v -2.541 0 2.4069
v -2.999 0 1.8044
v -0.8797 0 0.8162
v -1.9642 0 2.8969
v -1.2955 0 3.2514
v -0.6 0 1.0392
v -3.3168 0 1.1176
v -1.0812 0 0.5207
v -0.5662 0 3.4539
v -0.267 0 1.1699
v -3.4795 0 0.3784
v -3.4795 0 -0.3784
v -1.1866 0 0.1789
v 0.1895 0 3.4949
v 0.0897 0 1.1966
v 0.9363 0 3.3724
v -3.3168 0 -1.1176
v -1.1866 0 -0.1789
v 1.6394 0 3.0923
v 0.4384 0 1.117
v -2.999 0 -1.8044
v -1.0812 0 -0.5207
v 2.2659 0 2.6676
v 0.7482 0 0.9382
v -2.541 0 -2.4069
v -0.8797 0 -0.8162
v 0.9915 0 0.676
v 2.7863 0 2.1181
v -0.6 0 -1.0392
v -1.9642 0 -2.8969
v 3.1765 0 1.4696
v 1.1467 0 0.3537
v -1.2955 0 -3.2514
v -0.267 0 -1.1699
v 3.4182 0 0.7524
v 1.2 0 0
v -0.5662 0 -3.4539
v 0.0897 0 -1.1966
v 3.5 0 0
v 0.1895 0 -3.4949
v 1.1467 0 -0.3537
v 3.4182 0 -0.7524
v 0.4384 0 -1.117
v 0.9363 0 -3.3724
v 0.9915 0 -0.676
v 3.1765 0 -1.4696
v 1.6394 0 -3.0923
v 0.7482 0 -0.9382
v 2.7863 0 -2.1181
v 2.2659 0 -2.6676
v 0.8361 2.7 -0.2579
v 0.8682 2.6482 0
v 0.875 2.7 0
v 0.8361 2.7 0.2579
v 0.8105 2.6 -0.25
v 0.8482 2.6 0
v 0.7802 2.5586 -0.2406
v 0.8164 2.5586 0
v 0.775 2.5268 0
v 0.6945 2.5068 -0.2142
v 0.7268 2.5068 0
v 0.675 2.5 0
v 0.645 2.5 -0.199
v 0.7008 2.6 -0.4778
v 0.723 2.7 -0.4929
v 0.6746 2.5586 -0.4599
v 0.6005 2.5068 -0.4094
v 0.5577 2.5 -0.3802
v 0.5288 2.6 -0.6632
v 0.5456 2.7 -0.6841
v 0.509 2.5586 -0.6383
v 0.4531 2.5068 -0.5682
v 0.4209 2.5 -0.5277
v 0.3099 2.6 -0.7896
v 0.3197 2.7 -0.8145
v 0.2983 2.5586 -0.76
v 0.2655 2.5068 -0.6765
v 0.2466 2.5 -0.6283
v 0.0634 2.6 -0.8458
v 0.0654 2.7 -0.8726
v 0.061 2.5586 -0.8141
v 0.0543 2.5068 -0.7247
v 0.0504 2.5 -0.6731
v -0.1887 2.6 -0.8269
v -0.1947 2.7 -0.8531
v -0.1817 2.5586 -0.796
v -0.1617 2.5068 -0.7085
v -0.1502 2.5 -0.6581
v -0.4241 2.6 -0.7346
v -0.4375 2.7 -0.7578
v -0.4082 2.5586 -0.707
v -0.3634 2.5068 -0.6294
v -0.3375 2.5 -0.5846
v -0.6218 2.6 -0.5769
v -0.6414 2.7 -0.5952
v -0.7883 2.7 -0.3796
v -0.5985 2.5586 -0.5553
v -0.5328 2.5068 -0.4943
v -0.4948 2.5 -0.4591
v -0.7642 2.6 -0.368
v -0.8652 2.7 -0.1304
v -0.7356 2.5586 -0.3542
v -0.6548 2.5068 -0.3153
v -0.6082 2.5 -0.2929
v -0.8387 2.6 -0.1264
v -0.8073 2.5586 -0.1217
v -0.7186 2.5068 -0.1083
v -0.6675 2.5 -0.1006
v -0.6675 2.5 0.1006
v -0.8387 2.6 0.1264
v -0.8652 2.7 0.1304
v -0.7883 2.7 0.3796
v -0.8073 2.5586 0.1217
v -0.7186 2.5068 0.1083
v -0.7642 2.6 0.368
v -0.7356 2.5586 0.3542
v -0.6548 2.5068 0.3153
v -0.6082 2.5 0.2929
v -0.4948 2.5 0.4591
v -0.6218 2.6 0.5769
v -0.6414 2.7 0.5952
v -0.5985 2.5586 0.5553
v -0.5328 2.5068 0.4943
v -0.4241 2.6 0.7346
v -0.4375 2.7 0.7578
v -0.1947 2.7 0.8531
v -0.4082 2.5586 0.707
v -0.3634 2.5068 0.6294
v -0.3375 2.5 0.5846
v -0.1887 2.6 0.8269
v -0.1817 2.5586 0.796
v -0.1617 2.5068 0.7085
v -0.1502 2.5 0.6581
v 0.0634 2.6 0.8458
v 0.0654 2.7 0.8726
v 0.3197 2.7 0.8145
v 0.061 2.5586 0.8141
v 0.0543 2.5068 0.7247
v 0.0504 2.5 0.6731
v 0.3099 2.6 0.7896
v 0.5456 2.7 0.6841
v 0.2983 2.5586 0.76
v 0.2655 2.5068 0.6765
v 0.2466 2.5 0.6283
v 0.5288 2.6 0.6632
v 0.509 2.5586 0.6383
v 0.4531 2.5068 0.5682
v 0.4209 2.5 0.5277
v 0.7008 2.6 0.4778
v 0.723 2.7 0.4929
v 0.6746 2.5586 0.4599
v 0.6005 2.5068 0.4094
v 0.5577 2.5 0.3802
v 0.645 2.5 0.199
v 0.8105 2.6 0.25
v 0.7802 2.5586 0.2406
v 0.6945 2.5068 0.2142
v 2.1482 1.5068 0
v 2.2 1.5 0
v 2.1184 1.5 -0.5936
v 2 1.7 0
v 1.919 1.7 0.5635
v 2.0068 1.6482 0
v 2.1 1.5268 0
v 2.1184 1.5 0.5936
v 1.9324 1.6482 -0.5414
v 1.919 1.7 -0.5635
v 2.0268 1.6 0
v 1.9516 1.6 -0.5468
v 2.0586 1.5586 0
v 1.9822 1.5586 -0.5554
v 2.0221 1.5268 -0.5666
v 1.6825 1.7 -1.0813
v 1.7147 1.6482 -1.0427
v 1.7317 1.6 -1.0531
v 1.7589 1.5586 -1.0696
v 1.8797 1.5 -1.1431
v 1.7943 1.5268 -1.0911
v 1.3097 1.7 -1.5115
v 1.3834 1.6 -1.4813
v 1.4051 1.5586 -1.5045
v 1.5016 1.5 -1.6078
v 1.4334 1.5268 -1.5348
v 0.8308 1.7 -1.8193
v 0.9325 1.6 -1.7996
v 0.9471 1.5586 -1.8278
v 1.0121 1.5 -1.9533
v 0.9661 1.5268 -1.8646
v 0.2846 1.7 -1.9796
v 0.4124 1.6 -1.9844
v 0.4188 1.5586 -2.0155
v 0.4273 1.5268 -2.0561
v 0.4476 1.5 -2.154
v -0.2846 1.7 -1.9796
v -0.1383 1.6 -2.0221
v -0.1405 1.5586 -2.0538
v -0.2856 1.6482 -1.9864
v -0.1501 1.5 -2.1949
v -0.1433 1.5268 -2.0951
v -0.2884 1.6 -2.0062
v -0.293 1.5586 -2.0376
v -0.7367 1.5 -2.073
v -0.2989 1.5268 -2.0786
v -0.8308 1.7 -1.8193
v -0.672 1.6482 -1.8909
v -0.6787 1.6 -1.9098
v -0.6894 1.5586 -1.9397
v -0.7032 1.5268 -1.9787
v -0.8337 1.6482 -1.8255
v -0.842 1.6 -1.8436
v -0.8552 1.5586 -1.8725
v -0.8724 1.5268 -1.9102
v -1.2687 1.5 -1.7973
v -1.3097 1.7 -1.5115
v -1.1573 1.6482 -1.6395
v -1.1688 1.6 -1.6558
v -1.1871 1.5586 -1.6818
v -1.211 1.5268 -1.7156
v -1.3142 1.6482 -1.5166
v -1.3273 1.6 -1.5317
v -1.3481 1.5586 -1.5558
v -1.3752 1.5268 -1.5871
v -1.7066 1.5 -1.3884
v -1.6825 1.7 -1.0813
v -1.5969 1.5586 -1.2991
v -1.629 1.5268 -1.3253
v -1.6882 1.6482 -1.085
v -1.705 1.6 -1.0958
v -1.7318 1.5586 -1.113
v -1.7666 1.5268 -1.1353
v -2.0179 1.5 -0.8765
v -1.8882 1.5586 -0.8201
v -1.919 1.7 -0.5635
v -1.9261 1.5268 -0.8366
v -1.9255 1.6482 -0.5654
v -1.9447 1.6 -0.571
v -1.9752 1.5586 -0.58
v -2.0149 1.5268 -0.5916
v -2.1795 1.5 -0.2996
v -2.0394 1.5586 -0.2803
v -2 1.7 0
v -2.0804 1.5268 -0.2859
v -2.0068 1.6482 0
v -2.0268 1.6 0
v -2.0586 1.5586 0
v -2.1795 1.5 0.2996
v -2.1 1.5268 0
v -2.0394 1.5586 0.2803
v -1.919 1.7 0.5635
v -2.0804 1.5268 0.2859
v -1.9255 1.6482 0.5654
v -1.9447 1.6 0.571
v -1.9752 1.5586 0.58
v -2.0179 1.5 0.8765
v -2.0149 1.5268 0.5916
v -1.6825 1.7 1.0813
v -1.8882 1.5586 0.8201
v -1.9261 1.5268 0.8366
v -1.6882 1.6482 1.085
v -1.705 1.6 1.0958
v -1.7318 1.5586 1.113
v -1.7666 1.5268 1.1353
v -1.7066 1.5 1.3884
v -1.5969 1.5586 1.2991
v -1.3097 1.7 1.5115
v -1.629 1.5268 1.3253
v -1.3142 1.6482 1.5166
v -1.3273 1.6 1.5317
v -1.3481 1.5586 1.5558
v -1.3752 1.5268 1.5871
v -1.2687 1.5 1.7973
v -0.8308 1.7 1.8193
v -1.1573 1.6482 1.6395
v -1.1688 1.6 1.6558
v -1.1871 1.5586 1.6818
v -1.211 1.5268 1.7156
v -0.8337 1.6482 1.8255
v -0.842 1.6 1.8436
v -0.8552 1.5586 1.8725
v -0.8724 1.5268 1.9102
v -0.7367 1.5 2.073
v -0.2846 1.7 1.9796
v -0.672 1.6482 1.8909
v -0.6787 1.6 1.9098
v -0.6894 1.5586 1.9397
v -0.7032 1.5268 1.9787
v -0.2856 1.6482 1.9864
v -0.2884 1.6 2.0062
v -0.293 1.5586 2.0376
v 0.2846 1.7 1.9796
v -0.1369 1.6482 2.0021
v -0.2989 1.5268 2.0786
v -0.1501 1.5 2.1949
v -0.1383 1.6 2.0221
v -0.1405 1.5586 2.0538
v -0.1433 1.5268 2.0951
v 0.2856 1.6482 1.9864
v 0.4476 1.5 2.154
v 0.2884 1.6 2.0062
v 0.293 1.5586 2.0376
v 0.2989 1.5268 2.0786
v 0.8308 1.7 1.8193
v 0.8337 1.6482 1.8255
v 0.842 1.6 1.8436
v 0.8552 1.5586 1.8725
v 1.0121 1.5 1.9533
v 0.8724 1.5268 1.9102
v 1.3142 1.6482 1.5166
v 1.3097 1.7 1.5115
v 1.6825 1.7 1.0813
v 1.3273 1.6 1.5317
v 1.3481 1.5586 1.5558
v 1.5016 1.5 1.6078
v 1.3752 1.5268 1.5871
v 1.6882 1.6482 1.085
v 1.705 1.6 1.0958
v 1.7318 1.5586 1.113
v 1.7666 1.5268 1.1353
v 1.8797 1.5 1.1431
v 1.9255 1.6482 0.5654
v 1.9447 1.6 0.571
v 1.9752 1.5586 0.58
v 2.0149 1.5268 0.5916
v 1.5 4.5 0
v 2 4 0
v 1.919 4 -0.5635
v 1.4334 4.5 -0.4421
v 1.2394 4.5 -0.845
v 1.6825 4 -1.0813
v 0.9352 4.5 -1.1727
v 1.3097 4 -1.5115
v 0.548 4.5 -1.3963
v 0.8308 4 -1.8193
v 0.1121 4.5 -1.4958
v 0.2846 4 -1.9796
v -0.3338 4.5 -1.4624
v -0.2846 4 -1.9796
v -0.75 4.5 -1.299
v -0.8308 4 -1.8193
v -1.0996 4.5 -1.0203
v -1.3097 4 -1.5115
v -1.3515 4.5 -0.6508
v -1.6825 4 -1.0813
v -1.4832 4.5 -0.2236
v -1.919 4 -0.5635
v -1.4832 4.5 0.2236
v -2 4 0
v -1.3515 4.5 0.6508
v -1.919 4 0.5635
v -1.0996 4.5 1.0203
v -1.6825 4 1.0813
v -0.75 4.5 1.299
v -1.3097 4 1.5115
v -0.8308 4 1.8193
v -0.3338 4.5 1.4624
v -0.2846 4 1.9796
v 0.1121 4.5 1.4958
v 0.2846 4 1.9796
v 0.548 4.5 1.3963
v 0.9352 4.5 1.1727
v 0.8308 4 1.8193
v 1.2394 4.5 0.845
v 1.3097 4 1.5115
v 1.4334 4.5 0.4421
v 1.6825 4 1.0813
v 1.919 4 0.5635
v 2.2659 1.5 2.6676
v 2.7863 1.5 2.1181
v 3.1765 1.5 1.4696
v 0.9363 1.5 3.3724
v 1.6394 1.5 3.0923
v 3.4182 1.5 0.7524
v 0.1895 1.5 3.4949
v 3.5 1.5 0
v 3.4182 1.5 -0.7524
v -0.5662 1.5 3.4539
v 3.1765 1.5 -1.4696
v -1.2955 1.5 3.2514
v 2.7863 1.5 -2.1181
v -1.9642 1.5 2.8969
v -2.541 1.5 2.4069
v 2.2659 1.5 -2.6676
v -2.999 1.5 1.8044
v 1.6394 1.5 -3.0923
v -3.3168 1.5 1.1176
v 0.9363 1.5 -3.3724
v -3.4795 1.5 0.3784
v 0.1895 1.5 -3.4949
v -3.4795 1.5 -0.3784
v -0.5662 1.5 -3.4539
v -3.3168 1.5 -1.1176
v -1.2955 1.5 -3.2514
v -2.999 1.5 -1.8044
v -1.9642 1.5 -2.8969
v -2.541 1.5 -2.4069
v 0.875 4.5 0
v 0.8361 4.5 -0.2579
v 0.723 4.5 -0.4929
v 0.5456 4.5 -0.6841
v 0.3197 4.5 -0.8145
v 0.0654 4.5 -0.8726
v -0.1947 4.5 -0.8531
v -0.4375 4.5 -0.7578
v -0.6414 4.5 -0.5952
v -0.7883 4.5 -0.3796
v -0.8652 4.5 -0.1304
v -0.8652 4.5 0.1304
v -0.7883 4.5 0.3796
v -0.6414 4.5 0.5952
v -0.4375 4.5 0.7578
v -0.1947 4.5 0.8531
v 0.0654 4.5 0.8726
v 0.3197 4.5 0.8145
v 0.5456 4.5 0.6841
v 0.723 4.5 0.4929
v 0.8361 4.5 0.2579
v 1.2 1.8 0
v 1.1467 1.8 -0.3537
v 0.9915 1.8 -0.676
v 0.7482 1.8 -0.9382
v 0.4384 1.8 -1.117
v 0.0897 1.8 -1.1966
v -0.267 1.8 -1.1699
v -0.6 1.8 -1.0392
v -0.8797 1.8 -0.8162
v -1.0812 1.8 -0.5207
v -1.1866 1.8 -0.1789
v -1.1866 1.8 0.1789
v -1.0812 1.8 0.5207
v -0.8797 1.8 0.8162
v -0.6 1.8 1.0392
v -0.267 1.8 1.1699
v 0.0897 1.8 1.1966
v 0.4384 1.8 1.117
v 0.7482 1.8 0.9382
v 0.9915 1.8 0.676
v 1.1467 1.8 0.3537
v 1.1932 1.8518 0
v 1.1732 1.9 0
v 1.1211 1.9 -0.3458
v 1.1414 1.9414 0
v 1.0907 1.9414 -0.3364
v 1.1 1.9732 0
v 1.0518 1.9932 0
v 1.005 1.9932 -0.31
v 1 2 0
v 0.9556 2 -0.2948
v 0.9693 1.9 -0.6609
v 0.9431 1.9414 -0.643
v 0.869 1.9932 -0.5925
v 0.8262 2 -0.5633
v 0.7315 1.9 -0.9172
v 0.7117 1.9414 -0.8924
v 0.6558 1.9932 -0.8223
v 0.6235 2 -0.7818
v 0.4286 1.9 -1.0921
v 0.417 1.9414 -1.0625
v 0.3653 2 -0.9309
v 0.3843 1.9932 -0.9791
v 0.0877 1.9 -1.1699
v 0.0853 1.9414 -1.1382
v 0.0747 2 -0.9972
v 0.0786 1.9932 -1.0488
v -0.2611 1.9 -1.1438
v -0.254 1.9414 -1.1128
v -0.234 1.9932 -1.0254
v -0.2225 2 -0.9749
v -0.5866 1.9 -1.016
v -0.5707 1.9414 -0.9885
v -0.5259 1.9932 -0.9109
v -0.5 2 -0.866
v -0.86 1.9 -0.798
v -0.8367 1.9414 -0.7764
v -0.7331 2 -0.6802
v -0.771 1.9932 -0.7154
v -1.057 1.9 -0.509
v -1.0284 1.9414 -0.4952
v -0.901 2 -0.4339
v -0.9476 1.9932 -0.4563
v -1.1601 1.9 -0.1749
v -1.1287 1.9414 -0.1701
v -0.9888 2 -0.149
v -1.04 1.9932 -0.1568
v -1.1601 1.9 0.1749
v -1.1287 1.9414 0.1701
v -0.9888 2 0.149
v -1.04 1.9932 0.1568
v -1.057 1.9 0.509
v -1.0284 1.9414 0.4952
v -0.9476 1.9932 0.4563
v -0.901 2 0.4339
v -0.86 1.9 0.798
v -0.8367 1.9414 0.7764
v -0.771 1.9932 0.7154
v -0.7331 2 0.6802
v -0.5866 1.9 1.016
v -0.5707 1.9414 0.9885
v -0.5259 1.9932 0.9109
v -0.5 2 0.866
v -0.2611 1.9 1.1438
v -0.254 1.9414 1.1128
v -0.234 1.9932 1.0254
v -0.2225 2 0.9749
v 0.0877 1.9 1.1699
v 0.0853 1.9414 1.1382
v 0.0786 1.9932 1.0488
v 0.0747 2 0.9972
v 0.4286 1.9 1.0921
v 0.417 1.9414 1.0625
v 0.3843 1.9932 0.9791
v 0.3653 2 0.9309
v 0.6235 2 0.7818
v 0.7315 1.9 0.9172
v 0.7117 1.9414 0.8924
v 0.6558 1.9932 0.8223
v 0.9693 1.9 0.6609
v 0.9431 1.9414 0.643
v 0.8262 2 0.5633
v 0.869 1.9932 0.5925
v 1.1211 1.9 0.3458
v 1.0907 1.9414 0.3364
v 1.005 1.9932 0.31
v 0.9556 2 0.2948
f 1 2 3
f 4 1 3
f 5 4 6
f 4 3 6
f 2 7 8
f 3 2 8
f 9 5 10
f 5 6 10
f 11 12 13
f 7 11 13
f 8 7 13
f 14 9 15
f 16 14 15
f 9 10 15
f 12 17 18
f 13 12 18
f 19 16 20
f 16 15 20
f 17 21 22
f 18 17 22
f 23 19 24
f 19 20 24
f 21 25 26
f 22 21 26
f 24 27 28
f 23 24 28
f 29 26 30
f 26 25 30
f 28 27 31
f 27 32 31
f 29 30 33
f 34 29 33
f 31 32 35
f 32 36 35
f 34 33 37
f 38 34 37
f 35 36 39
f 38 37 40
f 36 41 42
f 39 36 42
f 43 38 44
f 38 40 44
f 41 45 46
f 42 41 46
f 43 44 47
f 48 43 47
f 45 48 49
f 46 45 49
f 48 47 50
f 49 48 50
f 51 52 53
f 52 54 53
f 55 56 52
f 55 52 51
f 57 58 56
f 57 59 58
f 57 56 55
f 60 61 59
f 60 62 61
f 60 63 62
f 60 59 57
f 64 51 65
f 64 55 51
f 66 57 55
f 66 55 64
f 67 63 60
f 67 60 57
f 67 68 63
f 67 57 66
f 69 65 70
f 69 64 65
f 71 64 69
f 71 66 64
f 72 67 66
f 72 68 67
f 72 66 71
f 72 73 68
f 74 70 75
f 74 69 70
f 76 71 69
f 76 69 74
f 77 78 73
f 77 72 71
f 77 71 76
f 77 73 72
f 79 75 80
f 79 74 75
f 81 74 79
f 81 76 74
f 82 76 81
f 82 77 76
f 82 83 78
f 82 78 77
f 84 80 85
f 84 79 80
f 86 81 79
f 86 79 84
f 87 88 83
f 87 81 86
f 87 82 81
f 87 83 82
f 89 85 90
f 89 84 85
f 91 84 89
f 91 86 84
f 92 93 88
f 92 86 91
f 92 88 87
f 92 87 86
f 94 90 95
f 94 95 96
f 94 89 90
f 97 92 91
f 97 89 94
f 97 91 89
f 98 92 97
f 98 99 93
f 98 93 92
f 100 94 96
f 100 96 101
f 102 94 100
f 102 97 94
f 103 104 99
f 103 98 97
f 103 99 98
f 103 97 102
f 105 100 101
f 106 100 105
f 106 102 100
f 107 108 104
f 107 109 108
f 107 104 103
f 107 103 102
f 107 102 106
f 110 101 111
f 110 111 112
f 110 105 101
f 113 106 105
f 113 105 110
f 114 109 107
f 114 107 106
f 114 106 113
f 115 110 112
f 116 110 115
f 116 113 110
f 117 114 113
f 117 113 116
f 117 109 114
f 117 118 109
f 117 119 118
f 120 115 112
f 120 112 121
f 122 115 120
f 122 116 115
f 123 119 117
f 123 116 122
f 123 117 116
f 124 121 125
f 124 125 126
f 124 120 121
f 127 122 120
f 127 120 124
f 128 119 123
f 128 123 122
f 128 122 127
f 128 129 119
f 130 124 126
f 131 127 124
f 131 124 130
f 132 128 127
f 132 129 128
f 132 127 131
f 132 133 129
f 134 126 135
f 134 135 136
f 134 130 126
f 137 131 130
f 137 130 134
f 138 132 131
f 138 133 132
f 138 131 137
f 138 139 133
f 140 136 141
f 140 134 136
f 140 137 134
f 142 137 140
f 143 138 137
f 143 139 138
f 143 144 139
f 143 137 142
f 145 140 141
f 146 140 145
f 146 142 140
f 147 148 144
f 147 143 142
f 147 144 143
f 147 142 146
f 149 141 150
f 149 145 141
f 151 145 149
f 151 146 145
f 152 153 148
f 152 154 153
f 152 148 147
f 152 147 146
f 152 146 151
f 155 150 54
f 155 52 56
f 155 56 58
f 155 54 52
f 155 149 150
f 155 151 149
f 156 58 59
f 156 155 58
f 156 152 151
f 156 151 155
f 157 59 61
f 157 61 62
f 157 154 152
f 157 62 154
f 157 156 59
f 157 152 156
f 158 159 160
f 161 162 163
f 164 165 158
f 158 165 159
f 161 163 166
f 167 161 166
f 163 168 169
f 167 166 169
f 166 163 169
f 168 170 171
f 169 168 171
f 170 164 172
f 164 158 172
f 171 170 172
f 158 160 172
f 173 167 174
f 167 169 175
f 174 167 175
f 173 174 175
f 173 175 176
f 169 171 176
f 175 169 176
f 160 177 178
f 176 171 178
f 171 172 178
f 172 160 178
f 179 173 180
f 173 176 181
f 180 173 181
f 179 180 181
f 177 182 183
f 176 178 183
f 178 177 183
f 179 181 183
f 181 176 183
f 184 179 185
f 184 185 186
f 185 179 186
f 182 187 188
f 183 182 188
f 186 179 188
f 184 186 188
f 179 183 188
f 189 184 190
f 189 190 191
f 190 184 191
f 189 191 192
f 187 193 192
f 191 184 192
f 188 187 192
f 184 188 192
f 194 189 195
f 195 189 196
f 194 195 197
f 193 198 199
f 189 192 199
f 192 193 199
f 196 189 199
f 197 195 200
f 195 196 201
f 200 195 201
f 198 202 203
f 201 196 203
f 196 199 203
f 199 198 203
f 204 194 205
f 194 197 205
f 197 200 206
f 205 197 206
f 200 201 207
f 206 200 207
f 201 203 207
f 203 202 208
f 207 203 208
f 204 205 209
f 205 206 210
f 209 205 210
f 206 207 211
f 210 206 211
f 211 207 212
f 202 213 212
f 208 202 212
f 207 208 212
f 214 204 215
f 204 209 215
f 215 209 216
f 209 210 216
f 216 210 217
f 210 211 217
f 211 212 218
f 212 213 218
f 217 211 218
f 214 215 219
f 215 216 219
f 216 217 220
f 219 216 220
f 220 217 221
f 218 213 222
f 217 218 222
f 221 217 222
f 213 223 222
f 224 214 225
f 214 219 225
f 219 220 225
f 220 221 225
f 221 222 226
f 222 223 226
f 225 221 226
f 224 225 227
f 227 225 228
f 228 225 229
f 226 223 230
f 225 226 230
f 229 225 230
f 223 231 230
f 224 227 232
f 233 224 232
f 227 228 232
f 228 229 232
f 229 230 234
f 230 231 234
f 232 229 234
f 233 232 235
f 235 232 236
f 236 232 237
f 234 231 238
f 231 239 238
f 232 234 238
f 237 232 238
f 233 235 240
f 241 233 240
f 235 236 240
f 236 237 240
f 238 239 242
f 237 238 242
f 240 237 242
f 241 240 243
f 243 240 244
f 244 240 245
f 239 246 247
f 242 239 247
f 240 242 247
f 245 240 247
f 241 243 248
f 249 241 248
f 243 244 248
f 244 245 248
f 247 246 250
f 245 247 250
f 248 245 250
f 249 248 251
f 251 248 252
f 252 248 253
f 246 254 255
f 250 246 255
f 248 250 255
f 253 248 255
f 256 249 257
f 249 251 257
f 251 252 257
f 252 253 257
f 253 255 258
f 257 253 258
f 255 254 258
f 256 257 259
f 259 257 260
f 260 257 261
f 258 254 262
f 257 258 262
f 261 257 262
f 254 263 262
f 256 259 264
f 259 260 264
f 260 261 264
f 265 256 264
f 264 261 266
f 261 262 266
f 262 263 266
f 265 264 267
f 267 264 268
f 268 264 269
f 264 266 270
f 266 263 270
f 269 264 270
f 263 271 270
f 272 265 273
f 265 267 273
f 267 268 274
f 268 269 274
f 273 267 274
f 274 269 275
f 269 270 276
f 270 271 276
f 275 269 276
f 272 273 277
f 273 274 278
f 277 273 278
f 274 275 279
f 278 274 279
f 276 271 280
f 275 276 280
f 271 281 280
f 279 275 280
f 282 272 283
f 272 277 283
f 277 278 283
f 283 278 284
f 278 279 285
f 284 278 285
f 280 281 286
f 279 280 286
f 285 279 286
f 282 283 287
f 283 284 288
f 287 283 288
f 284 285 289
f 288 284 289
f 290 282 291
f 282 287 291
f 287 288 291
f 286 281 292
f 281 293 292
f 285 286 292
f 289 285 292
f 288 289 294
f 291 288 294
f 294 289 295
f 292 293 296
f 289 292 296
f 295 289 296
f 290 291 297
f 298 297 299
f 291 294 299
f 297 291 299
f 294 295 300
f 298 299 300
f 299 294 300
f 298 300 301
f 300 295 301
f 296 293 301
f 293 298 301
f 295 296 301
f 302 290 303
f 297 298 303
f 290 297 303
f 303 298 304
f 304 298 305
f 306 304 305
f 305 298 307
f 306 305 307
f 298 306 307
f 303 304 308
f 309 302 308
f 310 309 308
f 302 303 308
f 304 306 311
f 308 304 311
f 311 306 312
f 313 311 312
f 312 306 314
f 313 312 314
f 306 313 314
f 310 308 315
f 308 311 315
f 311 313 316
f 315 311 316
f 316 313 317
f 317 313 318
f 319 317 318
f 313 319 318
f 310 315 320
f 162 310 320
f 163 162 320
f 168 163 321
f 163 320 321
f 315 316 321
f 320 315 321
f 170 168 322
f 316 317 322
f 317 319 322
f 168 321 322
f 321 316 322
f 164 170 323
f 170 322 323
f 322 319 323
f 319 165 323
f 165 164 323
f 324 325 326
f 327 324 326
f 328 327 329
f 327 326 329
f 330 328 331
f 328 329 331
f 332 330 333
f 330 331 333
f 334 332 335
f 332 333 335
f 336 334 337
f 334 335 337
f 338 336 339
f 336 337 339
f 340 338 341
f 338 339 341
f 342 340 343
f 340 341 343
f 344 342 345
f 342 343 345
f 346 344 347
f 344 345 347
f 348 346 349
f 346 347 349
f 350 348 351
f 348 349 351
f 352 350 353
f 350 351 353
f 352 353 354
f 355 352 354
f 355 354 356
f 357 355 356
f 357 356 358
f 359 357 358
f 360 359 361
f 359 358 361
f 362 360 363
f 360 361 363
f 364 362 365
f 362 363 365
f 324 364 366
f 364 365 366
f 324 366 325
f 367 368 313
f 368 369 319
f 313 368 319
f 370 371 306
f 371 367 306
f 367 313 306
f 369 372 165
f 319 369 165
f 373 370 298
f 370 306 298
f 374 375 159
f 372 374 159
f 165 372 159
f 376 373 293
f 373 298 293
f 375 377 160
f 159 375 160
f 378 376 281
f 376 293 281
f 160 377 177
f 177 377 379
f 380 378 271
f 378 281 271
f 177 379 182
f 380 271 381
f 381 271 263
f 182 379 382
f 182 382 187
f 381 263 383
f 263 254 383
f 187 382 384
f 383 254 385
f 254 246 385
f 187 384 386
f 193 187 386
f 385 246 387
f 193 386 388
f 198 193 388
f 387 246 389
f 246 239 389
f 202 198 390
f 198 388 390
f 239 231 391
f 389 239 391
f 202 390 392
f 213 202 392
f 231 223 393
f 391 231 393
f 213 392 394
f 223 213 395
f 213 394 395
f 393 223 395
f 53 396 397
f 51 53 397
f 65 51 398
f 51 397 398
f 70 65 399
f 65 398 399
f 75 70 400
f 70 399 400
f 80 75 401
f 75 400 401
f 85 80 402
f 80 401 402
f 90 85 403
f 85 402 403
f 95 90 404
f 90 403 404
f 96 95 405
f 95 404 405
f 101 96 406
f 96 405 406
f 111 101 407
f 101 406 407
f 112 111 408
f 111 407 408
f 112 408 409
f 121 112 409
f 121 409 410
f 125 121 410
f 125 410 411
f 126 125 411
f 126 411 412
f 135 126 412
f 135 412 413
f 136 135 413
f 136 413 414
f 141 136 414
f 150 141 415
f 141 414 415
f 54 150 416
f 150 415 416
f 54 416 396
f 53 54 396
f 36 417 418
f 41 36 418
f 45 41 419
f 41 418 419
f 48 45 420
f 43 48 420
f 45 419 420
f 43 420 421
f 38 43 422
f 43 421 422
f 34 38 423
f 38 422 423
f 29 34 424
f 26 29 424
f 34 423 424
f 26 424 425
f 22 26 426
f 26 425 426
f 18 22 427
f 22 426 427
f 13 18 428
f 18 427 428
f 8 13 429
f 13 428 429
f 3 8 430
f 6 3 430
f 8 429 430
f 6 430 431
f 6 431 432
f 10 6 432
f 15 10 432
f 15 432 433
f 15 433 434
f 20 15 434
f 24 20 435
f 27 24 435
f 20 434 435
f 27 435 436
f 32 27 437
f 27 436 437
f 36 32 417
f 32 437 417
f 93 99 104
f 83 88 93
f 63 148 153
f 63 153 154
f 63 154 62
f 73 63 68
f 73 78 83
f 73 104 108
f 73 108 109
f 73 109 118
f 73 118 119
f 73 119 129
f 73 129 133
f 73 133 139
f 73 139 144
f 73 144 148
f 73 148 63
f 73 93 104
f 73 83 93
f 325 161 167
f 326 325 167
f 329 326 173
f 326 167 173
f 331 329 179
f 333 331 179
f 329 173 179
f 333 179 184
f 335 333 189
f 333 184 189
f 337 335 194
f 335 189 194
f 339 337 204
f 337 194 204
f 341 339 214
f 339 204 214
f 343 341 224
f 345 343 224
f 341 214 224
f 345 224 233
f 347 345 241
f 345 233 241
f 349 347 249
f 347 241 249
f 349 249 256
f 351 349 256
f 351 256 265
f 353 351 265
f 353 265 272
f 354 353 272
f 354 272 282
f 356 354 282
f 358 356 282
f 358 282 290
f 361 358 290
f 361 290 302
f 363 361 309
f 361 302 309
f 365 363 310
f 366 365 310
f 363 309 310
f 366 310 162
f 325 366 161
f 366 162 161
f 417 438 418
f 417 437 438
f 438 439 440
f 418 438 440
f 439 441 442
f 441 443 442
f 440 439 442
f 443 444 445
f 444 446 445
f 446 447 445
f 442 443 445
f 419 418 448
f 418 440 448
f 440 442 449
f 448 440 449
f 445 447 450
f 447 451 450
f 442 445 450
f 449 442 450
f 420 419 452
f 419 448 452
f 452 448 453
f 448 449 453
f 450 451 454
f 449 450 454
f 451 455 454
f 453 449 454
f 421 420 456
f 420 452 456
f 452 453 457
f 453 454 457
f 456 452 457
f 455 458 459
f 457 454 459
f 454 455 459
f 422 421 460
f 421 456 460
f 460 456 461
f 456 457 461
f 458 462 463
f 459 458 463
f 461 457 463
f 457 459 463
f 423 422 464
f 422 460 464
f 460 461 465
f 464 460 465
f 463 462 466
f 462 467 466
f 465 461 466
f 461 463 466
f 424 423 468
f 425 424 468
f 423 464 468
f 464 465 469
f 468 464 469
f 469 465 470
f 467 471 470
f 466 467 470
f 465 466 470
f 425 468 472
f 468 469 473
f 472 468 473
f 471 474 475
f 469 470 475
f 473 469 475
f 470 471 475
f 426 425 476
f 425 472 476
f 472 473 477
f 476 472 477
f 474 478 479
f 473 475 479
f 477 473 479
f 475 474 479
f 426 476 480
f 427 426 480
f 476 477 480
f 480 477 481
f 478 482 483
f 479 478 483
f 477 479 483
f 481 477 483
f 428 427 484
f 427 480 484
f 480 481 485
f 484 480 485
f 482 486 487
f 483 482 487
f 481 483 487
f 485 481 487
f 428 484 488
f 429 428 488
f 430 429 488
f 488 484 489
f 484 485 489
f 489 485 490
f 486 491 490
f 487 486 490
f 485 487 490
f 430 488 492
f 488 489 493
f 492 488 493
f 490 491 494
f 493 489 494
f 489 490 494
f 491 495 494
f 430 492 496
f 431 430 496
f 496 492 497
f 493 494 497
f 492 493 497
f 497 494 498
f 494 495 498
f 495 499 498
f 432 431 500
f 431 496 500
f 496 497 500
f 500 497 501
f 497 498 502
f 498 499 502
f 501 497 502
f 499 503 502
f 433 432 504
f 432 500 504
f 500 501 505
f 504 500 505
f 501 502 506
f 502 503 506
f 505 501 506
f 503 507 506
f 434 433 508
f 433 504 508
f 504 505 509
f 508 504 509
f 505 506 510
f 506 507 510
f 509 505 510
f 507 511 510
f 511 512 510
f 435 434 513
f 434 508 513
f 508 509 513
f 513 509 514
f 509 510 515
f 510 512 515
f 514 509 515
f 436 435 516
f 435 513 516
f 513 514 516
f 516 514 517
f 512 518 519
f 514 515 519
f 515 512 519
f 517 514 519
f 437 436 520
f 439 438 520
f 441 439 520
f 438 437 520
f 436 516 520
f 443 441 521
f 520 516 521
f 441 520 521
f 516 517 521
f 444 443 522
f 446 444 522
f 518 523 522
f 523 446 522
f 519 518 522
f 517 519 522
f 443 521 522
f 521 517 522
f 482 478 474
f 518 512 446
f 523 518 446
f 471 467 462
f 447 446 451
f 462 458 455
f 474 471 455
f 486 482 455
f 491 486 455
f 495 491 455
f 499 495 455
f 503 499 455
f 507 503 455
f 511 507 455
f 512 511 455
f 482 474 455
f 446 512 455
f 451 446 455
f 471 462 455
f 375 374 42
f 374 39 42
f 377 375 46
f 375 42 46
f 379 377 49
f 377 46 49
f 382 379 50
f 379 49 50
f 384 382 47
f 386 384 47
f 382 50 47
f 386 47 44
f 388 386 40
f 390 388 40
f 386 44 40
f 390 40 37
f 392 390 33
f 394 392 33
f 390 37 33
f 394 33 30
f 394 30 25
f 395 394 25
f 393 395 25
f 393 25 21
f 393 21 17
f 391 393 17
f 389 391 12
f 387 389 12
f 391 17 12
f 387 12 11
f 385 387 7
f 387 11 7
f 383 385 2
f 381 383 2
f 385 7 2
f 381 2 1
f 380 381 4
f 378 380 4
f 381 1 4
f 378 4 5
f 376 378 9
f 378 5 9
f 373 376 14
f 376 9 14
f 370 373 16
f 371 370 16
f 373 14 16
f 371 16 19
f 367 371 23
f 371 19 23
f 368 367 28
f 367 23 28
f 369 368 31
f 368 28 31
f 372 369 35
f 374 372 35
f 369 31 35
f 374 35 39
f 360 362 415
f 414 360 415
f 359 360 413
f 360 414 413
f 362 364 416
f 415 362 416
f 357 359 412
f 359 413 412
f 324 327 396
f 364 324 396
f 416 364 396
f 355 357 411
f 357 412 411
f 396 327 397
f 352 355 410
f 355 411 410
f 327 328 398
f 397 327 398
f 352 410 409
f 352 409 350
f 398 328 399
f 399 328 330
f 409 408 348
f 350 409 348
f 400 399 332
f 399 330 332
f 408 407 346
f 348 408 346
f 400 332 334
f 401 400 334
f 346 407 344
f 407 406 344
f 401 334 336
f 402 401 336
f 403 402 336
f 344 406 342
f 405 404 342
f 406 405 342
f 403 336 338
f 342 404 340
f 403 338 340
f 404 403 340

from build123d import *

# Parameters (mm, degrees)
SKETCH3_R          = 0.875
CUT_EXTRUDE1_DEPTH = 2
CHAMFER1_SIZE      = 0.5
FILLET1_R          = 0.2
FILLET2_R          = 0.2


with BuildPart() as part:
    # Sketch2 → Revolve1 (revolve)
    with BuildSketch(Plane.XY):
        Polygon((0, 2), (0, 4.5), (2, 4.5), (2, 1.5), (3.5, 1.5), (3.5, 0), (1.2, 0), (1.2, 2), align=None)
    revolve(axis=Axis((0, 2, 0), (0, 1, 0)))

    # Sketch3 → Cut-Extrude1 (cut)
    with BuildSketch(Plane(origin=(0, 4.5, 0), x_dir=(1, 0, 0), z_dir=(0, 1, 0))):
        Circle(SKETCH3_R)
    extrude(amount=-CUT_EXTRUDE1_DEPTH, mode=Mode.SUBTRACT)

    # Chamfer1
    chamfer1_edges = [part.edges().sort_by_distance(p)[0] for p in [
        (-2, 4.5, 0),
    ]]
    chamfer(chamfer1_edges, length=CHAMFER1_SIZE)

    # Fillet1
    fillet1_edges = [part.edges().sort_by_distance(p)[0] for p in [
        (-2, 1.5, 0),
    ]]
    fillet(fillet1_edges, radius=FILLET1_R)

    # Fillet2
    fillet2_edges = [part.edges().sort_by_distance(p)[0] for p in [
        (-0.875, 2.5, 0),
        (-1.2, 2, 0),
    ]]
    fillet(fillet2_edges, radius=FILLET2_R)


solid = part.part
